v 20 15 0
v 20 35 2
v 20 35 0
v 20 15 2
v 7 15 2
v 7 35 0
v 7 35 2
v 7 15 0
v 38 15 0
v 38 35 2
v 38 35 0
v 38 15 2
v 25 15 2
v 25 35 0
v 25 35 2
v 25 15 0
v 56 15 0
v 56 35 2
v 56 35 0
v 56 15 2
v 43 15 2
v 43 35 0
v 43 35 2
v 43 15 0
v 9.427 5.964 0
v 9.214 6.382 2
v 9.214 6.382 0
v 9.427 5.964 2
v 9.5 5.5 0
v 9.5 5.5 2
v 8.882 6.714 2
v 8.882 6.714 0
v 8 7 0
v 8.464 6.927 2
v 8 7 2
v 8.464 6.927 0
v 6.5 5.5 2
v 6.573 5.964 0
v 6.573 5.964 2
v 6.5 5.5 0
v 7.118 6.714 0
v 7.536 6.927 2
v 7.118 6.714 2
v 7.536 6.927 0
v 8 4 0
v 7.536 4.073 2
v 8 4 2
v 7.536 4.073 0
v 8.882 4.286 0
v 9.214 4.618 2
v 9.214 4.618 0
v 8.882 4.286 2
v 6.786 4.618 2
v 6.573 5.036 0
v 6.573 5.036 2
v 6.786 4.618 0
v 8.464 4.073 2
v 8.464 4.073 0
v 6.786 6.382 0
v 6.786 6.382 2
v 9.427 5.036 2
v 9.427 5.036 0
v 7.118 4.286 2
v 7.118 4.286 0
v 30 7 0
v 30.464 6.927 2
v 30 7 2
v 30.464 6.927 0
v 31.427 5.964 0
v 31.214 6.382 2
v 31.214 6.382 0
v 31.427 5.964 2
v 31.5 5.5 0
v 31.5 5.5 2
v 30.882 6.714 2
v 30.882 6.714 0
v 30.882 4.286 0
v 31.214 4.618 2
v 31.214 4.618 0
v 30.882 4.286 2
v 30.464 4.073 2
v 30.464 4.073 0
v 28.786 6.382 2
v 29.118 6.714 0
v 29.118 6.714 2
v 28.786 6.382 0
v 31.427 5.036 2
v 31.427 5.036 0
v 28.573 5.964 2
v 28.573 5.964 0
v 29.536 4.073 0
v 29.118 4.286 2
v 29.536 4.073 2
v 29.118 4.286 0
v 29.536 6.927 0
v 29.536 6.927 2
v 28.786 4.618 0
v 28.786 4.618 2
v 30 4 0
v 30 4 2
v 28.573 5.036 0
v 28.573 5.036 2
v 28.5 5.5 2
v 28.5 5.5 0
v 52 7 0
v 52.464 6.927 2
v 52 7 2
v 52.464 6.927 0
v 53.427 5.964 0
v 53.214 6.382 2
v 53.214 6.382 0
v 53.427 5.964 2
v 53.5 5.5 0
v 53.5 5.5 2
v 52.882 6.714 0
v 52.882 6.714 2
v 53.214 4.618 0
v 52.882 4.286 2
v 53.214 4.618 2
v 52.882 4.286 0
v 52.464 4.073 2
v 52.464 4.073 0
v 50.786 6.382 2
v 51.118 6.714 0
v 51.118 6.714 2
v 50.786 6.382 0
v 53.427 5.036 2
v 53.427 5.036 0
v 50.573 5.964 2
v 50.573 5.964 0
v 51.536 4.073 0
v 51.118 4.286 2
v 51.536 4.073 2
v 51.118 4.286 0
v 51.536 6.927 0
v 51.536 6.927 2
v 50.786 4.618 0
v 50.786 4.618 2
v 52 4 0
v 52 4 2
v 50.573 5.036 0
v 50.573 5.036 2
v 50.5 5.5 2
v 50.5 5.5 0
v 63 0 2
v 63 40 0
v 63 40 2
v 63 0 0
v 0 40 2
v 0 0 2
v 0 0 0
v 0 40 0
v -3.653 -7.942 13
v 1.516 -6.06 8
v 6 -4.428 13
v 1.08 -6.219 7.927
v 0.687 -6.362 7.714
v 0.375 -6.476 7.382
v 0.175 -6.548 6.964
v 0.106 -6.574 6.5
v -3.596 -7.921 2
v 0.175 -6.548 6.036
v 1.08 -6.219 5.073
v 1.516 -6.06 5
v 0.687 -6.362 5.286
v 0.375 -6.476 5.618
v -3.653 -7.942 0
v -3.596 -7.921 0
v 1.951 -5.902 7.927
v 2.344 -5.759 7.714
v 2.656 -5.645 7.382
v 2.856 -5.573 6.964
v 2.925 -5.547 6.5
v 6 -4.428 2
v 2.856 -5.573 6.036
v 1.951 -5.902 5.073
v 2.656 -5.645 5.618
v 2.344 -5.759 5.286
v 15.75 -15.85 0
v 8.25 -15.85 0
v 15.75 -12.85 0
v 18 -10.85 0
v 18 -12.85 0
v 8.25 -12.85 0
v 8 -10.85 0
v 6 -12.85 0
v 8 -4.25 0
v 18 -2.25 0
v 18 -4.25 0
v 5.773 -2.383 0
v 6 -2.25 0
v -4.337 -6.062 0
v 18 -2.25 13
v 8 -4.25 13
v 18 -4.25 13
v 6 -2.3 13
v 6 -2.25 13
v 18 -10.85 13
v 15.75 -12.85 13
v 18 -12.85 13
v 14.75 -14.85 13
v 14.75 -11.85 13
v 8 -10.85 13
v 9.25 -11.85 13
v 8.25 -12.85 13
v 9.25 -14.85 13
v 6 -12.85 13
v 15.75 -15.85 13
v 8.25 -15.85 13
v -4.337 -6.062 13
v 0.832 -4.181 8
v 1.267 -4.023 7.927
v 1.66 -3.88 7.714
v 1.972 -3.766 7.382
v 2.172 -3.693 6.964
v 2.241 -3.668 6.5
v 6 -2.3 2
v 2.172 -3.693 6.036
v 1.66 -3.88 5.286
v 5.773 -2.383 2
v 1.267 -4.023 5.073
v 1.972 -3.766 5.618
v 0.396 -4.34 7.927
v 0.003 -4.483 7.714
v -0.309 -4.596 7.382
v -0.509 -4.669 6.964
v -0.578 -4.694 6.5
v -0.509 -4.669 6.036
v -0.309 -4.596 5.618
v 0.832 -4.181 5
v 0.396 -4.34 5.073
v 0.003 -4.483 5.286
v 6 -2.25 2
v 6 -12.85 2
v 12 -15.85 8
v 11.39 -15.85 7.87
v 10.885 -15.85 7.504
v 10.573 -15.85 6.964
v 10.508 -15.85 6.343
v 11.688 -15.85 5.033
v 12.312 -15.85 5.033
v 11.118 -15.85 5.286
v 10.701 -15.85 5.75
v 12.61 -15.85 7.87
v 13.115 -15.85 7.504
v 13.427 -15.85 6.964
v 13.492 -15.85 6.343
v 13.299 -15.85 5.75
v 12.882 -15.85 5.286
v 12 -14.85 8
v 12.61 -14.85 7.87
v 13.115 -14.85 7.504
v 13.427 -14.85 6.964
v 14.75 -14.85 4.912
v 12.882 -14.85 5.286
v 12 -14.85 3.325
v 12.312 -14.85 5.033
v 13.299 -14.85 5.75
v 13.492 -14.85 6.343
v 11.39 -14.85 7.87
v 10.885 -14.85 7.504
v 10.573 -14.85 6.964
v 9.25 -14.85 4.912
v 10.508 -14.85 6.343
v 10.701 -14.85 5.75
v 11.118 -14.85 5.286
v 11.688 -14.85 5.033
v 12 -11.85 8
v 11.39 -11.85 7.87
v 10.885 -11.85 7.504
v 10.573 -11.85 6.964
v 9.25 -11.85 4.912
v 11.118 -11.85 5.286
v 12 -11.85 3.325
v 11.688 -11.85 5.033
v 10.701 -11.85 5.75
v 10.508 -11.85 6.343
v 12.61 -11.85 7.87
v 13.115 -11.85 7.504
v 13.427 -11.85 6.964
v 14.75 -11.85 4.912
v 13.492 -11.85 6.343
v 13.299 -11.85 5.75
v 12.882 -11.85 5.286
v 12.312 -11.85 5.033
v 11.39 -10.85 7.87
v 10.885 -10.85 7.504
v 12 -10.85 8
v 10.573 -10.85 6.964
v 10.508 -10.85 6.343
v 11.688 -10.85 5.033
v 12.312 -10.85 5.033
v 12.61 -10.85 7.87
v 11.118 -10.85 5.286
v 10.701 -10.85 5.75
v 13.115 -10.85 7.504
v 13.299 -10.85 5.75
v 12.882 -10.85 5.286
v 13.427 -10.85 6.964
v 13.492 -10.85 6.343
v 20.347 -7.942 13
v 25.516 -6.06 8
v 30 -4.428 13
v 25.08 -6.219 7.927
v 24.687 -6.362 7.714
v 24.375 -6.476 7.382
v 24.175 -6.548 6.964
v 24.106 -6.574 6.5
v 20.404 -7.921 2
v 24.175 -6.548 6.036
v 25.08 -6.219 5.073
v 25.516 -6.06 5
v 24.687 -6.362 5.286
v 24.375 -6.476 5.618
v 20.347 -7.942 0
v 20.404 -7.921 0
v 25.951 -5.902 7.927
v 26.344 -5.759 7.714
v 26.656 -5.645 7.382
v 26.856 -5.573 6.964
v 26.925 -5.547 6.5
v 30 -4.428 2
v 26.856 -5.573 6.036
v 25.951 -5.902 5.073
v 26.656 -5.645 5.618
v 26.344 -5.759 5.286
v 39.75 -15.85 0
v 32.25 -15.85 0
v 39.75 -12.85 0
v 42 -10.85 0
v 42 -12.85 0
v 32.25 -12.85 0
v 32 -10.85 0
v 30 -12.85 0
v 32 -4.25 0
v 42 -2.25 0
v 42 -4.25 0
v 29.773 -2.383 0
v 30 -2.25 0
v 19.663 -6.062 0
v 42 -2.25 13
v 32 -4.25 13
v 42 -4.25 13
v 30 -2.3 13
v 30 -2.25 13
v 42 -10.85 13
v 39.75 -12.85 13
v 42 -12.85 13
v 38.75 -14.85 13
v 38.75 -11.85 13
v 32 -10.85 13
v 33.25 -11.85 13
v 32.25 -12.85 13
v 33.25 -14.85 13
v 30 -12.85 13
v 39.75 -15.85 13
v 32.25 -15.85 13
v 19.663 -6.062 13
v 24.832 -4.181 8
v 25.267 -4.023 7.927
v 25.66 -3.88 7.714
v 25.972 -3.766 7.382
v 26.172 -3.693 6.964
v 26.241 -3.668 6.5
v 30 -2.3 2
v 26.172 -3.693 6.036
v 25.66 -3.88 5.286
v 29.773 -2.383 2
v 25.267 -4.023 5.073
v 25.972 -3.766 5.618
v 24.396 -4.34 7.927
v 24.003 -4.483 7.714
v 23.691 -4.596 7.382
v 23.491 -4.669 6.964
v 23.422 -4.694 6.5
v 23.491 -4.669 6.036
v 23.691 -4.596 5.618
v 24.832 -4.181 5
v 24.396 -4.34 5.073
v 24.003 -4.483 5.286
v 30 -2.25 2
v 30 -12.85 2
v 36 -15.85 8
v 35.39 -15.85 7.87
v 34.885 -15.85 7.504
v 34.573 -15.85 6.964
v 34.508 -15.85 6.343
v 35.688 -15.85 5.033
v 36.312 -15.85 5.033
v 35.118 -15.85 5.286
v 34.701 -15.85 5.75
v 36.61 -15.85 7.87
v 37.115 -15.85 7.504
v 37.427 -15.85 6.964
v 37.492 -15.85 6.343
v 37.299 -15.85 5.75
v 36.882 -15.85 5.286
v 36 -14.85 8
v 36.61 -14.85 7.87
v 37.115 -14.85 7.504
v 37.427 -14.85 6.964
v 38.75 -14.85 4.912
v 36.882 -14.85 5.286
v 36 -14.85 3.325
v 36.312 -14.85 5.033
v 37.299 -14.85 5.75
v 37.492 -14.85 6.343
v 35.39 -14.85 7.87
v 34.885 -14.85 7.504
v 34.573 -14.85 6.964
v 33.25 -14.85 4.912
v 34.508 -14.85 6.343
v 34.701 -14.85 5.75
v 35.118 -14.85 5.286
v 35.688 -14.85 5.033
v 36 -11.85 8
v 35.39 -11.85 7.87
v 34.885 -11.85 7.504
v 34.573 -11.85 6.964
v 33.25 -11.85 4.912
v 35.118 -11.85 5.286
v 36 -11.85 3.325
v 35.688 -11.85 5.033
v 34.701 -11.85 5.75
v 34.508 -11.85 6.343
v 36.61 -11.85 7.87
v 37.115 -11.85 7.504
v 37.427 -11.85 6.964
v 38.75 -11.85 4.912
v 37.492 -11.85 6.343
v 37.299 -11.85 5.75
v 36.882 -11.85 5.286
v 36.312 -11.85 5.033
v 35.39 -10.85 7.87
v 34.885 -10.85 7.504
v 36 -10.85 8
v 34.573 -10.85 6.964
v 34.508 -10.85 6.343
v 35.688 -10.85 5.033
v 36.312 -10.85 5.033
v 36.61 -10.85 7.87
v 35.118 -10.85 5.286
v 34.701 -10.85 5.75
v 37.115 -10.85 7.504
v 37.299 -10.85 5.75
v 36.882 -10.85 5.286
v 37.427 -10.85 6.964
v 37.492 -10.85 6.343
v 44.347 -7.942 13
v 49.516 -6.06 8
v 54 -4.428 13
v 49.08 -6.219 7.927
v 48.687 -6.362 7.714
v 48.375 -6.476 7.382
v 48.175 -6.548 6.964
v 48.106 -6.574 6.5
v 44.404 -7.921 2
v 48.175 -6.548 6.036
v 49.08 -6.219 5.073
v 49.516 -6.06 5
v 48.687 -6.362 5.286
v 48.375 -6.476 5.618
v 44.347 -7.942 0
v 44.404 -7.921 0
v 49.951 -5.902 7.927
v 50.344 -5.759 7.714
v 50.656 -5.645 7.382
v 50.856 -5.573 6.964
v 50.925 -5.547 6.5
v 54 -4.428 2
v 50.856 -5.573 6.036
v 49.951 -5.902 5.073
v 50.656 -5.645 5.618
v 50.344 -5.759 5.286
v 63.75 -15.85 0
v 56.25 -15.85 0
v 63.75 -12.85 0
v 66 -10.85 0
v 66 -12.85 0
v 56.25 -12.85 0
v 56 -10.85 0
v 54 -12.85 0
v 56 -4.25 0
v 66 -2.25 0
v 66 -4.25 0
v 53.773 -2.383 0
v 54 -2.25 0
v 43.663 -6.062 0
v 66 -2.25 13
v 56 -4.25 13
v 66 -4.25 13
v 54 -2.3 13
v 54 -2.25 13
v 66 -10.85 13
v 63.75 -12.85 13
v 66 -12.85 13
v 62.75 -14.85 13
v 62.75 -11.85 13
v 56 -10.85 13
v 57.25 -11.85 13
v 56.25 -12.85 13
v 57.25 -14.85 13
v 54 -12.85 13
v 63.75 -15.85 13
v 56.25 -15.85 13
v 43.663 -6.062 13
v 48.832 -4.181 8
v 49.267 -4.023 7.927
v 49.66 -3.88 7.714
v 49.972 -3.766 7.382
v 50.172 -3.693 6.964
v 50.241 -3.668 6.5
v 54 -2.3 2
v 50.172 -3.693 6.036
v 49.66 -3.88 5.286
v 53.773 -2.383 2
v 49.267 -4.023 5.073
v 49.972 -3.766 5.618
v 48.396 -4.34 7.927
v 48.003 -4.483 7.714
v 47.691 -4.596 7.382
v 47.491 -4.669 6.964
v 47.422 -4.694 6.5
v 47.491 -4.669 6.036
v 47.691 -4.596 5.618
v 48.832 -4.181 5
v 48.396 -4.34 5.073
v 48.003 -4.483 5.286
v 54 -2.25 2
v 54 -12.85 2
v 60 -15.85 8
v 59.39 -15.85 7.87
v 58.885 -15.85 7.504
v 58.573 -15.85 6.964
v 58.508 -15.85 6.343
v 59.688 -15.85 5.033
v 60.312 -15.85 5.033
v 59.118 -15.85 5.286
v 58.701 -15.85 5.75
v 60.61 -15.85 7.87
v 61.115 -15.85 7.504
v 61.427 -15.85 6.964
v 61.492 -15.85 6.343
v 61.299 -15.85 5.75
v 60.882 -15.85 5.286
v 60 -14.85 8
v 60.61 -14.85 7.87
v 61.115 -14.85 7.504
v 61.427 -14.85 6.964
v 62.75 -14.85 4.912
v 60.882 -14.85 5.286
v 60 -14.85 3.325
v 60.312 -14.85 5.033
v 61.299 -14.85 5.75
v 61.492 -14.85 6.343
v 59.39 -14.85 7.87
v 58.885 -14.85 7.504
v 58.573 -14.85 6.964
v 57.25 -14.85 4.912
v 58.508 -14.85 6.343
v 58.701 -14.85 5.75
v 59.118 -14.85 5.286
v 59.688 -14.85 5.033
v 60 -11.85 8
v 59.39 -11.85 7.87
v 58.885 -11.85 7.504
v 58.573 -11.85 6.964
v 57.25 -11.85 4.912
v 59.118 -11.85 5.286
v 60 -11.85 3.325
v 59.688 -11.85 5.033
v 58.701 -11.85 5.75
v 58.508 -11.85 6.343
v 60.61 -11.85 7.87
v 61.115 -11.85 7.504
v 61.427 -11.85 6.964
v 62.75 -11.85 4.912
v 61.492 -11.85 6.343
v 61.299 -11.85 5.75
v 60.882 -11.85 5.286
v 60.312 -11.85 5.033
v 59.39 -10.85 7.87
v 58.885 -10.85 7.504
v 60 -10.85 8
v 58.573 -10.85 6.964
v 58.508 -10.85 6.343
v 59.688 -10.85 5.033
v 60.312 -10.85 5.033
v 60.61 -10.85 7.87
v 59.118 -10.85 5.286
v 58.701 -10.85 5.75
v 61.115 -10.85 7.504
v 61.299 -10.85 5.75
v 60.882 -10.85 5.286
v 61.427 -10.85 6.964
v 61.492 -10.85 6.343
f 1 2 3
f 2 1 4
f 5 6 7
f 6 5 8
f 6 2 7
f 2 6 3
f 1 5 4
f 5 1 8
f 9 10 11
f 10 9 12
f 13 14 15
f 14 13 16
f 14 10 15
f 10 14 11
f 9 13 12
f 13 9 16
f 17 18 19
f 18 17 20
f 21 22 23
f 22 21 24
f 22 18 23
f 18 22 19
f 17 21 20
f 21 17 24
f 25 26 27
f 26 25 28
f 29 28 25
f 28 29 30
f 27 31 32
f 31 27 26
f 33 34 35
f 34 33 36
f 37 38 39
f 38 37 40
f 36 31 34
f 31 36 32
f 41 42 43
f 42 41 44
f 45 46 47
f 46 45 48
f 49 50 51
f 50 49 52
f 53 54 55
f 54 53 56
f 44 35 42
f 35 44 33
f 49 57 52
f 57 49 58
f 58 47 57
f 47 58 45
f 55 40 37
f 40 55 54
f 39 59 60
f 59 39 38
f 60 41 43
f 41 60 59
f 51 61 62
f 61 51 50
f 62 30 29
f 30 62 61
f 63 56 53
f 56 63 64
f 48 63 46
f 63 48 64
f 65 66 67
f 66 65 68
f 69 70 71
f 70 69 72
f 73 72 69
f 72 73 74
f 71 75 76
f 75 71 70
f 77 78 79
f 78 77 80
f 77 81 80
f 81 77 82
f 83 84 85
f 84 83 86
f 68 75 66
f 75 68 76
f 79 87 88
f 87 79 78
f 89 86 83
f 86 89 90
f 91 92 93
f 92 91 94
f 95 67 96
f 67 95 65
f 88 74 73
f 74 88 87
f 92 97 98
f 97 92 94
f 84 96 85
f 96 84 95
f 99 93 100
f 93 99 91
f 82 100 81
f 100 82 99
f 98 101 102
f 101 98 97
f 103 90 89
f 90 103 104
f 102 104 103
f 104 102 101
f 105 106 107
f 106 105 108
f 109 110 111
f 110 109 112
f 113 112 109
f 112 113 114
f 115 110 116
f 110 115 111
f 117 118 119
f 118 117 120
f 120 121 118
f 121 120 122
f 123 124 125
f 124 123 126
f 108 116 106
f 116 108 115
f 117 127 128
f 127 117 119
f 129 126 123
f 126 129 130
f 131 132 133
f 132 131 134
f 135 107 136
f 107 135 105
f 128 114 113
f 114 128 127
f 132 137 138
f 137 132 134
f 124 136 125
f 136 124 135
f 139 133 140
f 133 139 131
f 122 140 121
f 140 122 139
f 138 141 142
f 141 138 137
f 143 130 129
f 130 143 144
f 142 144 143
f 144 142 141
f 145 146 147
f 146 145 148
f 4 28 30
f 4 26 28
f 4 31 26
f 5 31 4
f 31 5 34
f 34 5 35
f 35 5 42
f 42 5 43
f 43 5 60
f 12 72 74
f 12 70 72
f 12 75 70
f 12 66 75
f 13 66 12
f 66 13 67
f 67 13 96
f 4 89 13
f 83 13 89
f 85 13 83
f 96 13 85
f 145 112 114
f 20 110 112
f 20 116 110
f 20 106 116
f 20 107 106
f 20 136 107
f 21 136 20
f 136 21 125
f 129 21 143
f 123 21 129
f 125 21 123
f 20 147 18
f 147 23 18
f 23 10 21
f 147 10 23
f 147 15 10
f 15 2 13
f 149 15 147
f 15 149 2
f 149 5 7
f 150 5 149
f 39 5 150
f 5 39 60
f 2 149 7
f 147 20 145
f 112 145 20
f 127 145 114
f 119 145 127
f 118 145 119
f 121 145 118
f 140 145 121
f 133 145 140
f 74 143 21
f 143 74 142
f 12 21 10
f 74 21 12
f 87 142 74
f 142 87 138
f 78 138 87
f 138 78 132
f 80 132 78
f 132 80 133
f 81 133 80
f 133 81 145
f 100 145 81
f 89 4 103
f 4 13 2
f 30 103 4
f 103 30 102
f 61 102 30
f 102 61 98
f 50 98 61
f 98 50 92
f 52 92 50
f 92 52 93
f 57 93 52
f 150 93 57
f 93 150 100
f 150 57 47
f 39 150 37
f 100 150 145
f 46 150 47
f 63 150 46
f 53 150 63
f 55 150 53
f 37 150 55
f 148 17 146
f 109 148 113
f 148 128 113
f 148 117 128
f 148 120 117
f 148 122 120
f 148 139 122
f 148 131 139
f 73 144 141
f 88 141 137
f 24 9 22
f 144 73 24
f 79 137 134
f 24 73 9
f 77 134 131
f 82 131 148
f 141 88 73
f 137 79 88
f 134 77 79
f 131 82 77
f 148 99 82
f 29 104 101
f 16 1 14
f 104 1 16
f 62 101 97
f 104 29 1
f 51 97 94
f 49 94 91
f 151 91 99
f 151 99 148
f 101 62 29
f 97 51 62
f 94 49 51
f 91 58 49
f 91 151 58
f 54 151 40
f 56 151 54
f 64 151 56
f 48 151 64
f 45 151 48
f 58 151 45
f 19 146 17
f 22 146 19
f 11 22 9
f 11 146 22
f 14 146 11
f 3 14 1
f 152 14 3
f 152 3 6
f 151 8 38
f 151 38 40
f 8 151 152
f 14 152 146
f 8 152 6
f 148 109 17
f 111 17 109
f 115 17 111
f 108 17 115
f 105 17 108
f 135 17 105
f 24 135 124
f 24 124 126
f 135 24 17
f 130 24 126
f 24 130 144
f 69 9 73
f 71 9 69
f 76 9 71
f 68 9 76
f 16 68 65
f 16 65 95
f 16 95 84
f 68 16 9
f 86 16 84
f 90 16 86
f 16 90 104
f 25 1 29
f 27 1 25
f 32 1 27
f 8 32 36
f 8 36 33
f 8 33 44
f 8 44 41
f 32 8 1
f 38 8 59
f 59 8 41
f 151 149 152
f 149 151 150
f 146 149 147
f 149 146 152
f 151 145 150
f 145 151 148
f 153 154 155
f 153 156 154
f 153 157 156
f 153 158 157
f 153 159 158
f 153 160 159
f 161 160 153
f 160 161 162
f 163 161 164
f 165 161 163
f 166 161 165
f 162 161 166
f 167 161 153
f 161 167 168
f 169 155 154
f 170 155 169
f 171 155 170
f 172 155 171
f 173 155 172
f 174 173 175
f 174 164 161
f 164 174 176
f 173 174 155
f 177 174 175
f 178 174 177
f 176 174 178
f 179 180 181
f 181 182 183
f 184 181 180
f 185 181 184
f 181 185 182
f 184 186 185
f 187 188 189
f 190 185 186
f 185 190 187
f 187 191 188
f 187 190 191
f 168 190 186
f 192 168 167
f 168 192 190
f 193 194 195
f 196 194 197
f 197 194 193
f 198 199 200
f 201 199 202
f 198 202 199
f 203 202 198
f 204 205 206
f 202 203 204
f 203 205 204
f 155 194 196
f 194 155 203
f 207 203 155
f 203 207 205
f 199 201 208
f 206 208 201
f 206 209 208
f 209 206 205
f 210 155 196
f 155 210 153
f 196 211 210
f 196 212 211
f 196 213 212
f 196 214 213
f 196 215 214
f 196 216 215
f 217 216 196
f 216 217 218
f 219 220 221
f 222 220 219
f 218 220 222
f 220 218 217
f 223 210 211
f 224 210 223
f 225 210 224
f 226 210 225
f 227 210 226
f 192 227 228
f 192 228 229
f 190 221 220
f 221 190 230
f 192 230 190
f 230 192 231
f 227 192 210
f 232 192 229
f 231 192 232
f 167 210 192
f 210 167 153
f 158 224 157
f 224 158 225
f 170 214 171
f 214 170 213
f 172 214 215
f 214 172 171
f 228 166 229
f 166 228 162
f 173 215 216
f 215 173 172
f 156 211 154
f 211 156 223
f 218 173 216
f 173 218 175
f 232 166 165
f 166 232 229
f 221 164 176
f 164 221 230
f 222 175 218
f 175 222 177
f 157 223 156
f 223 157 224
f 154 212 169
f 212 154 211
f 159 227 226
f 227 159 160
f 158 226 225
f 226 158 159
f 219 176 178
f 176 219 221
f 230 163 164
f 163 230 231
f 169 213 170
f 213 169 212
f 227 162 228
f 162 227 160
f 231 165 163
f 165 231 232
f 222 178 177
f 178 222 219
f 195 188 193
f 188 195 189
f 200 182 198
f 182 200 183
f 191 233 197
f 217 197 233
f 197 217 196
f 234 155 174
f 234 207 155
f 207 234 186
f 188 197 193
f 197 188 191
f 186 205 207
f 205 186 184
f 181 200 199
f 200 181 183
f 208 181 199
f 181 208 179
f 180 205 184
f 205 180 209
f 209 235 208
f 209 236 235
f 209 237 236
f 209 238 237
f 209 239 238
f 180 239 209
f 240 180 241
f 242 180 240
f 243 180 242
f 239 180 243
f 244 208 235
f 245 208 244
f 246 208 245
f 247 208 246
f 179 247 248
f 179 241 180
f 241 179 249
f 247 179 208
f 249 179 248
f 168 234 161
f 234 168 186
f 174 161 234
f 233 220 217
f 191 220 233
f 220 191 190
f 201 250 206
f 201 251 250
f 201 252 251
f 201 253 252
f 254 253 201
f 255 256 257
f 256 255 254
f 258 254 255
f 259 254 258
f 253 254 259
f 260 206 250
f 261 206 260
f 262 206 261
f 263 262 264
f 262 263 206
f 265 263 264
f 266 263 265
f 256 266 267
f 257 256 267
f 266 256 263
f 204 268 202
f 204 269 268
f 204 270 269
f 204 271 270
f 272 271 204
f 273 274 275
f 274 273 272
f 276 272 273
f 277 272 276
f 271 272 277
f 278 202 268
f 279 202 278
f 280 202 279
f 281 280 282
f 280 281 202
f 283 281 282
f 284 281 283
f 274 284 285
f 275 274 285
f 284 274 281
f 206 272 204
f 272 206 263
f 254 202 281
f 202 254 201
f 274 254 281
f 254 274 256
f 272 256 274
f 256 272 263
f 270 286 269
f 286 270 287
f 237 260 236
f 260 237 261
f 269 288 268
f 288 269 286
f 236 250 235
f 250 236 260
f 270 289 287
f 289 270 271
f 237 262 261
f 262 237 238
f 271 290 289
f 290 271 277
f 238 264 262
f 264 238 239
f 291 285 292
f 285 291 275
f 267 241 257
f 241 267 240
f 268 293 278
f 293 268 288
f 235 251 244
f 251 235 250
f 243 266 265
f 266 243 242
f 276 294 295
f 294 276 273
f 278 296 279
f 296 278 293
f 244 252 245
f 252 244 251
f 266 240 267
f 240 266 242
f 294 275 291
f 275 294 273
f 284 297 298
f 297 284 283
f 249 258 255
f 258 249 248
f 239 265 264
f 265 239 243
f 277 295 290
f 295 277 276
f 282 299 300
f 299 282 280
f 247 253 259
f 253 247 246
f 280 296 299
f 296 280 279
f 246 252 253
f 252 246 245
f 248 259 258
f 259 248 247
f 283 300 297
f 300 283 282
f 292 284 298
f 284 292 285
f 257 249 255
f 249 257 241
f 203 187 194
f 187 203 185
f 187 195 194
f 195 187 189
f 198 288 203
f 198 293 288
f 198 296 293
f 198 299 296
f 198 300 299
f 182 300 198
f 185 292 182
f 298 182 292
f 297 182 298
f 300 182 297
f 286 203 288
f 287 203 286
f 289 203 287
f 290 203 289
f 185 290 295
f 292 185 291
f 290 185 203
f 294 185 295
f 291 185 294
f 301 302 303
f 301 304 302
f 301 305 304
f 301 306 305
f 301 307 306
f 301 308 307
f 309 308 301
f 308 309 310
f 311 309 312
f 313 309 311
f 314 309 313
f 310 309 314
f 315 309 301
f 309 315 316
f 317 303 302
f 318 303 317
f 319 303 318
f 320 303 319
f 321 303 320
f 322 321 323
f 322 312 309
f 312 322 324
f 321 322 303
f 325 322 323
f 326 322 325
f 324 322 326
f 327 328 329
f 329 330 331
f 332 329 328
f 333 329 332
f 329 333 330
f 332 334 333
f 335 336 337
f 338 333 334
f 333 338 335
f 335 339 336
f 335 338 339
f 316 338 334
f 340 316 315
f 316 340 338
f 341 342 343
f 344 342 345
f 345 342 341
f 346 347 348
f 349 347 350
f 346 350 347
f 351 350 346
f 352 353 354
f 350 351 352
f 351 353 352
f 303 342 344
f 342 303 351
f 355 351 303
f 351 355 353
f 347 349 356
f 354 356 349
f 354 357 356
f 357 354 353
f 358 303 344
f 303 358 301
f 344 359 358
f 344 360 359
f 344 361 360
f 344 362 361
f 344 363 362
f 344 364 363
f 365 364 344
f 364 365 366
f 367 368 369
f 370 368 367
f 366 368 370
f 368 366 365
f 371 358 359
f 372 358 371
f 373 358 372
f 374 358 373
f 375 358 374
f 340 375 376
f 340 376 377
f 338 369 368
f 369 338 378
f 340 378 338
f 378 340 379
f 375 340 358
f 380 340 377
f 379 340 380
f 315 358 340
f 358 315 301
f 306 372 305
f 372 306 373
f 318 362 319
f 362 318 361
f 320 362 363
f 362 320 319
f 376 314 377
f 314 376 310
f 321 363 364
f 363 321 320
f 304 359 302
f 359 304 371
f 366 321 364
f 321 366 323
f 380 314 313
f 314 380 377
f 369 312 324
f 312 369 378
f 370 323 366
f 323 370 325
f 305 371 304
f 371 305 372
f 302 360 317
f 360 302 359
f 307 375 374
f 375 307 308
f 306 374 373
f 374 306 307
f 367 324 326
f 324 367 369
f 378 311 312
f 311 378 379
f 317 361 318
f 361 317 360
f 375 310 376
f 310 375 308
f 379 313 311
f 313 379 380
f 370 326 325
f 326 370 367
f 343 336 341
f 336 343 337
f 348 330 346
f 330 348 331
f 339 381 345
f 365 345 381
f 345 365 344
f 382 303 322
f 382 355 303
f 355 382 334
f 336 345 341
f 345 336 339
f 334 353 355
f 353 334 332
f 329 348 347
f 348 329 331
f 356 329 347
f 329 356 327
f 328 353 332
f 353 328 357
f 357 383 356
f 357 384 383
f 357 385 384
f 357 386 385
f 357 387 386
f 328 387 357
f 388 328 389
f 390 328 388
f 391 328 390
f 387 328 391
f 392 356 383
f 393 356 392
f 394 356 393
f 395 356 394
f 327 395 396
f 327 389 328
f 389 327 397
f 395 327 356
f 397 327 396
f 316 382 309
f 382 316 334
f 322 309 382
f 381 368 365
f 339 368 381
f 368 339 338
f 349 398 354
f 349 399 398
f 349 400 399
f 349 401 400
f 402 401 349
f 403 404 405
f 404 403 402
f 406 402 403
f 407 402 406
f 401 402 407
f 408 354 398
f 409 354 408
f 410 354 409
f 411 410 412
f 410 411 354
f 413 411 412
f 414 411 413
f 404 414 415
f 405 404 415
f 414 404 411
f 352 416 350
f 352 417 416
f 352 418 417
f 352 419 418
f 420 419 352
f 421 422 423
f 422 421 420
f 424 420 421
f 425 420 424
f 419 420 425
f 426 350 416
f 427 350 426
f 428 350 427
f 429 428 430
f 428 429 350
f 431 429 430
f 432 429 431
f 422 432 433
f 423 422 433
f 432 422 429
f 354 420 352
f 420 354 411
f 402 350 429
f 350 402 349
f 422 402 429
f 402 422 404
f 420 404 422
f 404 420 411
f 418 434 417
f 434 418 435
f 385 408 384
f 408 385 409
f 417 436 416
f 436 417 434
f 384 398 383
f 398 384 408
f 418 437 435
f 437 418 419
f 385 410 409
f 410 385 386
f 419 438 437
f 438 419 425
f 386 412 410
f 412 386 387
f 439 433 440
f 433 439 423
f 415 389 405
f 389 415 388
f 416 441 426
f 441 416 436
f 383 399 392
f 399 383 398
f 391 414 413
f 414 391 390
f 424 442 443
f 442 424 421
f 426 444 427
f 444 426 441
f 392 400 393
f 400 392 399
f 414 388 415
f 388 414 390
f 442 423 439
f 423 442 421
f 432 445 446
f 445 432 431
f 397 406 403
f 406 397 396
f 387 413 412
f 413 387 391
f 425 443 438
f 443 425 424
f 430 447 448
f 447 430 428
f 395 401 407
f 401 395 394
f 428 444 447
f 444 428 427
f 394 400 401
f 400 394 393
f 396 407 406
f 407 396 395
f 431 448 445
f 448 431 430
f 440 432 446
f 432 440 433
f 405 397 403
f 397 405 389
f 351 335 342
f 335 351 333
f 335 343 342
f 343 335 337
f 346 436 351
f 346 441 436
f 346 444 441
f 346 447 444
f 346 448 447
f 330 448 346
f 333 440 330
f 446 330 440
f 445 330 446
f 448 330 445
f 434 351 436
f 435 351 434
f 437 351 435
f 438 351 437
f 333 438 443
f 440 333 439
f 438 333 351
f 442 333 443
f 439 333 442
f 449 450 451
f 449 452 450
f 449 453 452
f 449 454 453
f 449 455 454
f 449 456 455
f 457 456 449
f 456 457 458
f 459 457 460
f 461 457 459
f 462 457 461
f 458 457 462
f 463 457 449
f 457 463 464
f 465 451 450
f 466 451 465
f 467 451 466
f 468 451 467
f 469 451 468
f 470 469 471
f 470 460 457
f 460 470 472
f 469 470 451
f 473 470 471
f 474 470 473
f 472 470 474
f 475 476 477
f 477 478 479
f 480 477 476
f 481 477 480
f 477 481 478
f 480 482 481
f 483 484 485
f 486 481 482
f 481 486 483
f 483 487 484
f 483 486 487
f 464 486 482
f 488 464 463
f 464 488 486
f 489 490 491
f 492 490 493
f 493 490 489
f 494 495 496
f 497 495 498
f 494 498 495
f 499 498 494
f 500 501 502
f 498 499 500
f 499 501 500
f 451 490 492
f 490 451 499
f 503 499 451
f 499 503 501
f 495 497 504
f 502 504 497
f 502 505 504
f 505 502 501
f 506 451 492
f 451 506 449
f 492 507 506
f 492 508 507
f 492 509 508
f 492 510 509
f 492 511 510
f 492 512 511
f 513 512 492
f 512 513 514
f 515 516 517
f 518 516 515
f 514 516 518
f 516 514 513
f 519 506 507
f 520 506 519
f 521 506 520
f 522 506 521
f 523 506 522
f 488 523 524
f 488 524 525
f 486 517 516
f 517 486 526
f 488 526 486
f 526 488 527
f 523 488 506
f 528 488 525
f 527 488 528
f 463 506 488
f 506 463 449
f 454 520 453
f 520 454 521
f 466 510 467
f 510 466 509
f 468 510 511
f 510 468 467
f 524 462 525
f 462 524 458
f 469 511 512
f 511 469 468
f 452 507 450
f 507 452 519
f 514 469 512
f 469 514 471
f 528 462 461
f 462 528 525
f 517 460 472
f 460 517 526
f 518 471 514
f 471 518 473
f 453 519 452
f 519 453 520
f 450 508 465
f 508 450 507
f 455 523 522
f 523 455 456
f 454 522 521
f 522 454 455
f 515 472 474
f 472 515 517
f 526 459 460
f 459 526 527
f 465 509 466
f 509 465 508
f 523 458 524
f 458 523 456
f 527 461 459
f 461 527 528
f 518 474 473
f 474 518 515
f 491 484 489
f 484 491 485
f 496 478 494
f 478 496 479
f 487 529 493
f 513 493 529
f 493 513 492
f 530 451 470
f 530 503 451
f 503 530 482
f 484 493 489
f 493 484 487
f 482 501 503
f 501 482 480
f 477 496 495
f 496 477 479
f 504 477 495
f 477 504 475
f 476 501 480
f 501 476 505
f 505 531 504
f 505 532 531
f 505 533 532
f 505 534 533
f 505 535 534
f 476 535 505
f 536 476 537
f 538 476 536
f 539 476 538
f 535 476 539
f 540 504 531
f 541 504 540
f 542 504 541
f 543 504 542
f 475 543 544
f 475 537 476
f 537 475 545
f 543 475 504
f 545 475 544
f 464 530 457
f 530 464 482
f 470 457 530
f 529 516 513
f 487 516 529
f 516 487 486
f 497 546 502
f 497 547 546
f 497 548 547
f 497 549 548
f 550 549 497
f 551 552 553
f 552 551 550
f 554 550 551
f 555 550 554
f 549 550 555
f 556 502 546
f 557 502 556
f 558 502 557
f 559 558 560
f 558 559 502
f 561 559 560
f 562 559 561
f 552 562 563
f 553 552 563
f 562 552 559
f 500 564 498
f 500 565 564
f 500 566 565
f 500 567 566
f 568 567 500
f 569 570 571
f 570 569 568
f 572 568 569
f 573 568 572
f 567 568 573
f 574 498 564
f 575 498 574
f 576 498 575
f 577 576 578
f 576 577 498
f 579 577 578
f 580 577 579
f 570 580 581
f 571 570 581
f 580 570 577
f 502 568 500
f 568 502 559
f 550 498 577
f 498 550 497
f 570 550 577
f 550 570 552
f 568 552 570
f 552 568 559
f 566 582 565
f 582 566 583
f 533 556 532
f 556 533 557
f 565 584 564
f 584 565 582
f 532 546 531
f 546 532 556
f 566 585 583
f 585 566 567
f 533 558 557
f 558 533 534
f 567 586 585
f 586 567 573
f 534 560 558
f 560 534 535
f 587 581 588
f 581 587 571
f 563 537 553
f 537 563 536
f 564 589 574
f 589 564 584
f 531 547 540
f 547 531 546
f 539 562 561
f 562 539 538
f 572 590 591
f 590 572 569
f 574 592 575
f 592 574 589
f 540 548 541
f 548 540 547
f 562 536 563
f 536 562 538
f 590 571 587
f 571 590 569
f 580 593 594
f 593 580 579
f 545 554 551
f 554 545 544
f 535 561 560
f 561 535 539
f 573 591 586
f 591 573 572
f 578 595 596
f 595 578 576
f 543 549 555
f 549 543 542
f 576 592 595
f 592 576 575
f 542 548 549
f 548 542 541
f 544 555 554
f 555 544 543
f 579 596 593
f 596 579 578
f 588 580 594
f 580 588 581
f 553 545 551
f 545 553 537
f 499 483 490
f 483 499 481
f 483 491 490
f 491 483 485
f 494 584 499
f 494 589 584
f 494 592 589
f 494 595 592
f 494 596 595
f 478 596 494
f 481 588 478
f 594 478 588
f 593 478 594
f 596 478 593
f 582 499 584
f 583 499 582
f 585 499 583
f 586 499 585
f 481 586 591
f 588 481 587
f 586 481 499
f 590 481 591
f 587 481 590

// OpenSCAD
// [FL_INDEX: keywords="openscad, 3d_parametric, Customizable_Rocker_Switch_Panel__attaches_to_boards__like_i3, csg_solid" | COT="Parametric OpenSCAD design from 3DCodeverse"]
// Title: Customizable Rocker Switch Panel (attaches to boards, like i3) 

/*
 * Rocker Switch Panel, v0.42
 *
 * by Alex Franke (CodeCreations), Feb 2014
 * http://www.theFrankes.com
 * 
 * Licenced under Creative Commons Attribution - Non-Commercial - Share Alike 3.0 
 * 
 * INSTRUCTIONS: Choose some values in the "User-defined values" section, and render. 
 * 
 * v1.00, Mar 7, 2014: Supports angles between 90-180, suggested by MyMakibox 
 * v0.42, Feb 1, 2014: Initial Release.
 */
 
/////////////////////////////////////////////////////////////////////////////
// User-defined values... 
/////////////////////////////////////////////////////////////////////////////
 
/* [General Properties] */

// The thickness of the material (switch panel, clip, etc)
thickness = 2;

// The in-diameter of mounting nut (flat to flat)
nutInDiameter = 5.5; 

// The height of the mounting nut
nutHeight = 2.5; 

// The diameter of the screw holes 
screwHoleDiameter = 3; 

// Curve quality
$fn = 20;


/* [Switch Properties] */

// How many rows of switches? 
rows = 1; 

// How many columns of switches? 
columns = 3; 

// The width of the switch opening
switchWidth = 13;

// The length of the switch opening
switchLength = 20; 


/* [Mounting Clip Properties] */

// The angle of the mounted panel 
angle = 70; 

// The number of mounting clips
mountingClips = 3; 

// The distance between the mounting clips and the edges of the panel 
mountingClipMargin = 3;

// The width of the clip that attaches to the board
clipWidth = 13;

// The thickness of the board you're mounting the clips onto
boardWidth = 6.6; 

// The length that the clips extend over the board
boardClampLength = 10; 

// The length of the extender tab that you mount the panel to
extenderLength = 11; 


/* [Spacing] */

// The amount of space between each column of switches (X direction) 
xSwitchPadding = 5;

// The amount of space between each row of switches (Y direction) 
ySwitchPadding = 6;

// The amount of space between the switches and the left and right edges of the panel
xMargin = 7;  

// The amount of space between the switches and the top and bottom edges of the panel
yMargin = 5;  

// How much space to leave for labels
labelPadding = 10; 

// Should label space go below the switch or above it?
labelBelow = true;


/////////////////////////////////////////////////////////////////////////////
// The code... 
/////////////////////////////////////////////////////////////////////////////

rockerSwitchPanel();

yOffset = ( angle < 90 ) ? 0 : extenderLength * cos(180-angle);

translate([
	(thickness+boardClampLength+extenderLength+1)/2,
	-((thickness*2+boardWidth+nutHeight)/2)-1 - yOffset,
	clipWidth/2
	]) 
for ( i=[0:mountingClips-1] ) {
	translate([(thickness+boardClampLength+extenderLength+1)*i,0,0]) 
	mount();
}


/////////////////////////////////////////////////////////////////////////////
// Modules... 
/////////////////////////////////////////////////////////////////////////////

module rockerSwitchPanel() {

	panelSize = [
		columns*switchWidth + xSwitchPadding*(columns-1) + xMargin*2,
		rows*(switchLength+labelPadding) + ySwitchPadding*(rows-1) + yMargin*2,
		thickness
		];
	clipSeperation = (panelSize[0] - 2*mountingClipMargin - mountingClips*clipWidth)
		/(mountingClips-1);

	union() {

		// mounting clips
*		translate([
			mountingClipMargin+boardClampLength/2,
			(thickness*2+boardWidth)/2,
			-(thickness+boardClampLength)/2
		]) 
		for ( i=[0:mountingClips-1] ) { 
			translate([i*(clipSeperation+clipWidth),0,0]) 
			rotate([0,90,180]) 
			mount(); 
		}

		// panel
		//	rotate([angle,0,0]) 
		difference() {
			cube(panelSize);
			
			translate([xMargin,yMargin+(labelBelow?labelPadding:0),-0.5]) 
			for( i=[0:columns-1], j=[0:rows-1] ) {
				translate([
					i*(switchWidth+xSwitchPadding),
					j*(switchLength+ySwitchPadding+labelPadding),
					0]) 		
				 	cube([switchWidth, switchLength, thickness+1]);
			}

			// mounting holes 
			translate([
				mountingClipMargin+boardClampLength/2,
				extenderLength/2,
				-0.5
				])
			for ( i=[0:mountingClips-1] ) { 
				translate([i*(clipSeperation+clipWidth),0,0]) 
				cylinder( h=thickness+1, r= screwHoleDiameter/2);
			}
		}
	}
}

module mount () {

	boxSize = [thickness+boardClampLength,thickness*2+boardWidth,clipWidth]; 

	difference() {
		union() {
			cube(boxSize, center=true); 
			translate([0,-boardWidth/2-((nutHeight + 0.5)+thickness)/2,0]) 
				cube([nutInDiameter+thickness,(nutHeight + 0.5)+thickness,clipWidth], center=true); 

			translate([-boxSize[0]/2,boxSize[1]/2-0.05,clipWidth/2]) 
			rotate([180,0,-angle]) 
			difference() {
				union() {
					cube([thickness,extenderLength,clipWidth], center=false); 
					if ( angle > 90 ) 
						translate([0,-thickness+0.05,0]) 
						cube([thickness,thickness,clipWidth], center=false); 
				}
				translate([-0.5,extenderLength/2,clipWidth/2]) 
				rotate([0,90,0]) 
				cylinder(h=thickness+1, r=screwHoleDiameter/2);
			}

			translate([0,0,-clipWidth/2]) 
			linear_extrude( height=thickness ) 
				polygon( points=[
					[-boxSize[0]/2,-boxSize[1]/2],
					[-boxSize[0]/2,boxSize[1]/2],
					[-boxSize[0]/2-extenderLength*sin(angle)+thickness*sin(90-angle),
						boxSize[1]/2-extenderLength*cos(angle)-thickness*cos(90-angle)]
					] ); 

		}
		translate([thickness,0,0]) 
			cube([boxSize[0],boardWidth,clipWidth+1], center=true); 

		translate([0,-(boardWidth/2 + (nutHeight + 0.5)/2 + thickness/2),0])
		rotate([90,-90,0]) 
		captiveNut( [nutInDiameter,nutHeight + 0.5], setScrewHoleDiameter=screwHoleDiameter, 
			depth=10, holeLengthTop=5, holeLengthBottom=5 );
	}
}


// This is the captive nut module I use in several of my designs. 
module captiveNut( nutSize, setScrewHoleDiameter=3, 
	depth=10, holeLengthTop=5, holeLengthBottom=5 )
{
	render()
	union() {
		nut( nutSize ); 
	
		if ( depth > 0 ) 
			translate([depth/2,0,0]) 
				cube( [depth, nutSize[0], nutSize[1]], center=true );
	
		translate([0,0,-(nutSize[1]/2)-holeLengthBottom]) 
			cylinder(r=setScrewHoleDiameter/2, h=nutSize[1]+holeLengthTop+holeLengthBottom, $fn=15);
	}
}

// nutSize = [inDiameter,thickness]
// (Yes, it's a little nutty.)
module nut( nutSize ) { 
	side = nutSize[0] * tan( 180/6 );
	if ( nutSize[0] * nutSize[1] != 0 ) {
		for ( i = [0 : 2] ) {
			rotate( i*120, [0, 0, 1]) 
				cube( [side, nutSize[0], nutSize[1]], center=true );
		}
	}
}
